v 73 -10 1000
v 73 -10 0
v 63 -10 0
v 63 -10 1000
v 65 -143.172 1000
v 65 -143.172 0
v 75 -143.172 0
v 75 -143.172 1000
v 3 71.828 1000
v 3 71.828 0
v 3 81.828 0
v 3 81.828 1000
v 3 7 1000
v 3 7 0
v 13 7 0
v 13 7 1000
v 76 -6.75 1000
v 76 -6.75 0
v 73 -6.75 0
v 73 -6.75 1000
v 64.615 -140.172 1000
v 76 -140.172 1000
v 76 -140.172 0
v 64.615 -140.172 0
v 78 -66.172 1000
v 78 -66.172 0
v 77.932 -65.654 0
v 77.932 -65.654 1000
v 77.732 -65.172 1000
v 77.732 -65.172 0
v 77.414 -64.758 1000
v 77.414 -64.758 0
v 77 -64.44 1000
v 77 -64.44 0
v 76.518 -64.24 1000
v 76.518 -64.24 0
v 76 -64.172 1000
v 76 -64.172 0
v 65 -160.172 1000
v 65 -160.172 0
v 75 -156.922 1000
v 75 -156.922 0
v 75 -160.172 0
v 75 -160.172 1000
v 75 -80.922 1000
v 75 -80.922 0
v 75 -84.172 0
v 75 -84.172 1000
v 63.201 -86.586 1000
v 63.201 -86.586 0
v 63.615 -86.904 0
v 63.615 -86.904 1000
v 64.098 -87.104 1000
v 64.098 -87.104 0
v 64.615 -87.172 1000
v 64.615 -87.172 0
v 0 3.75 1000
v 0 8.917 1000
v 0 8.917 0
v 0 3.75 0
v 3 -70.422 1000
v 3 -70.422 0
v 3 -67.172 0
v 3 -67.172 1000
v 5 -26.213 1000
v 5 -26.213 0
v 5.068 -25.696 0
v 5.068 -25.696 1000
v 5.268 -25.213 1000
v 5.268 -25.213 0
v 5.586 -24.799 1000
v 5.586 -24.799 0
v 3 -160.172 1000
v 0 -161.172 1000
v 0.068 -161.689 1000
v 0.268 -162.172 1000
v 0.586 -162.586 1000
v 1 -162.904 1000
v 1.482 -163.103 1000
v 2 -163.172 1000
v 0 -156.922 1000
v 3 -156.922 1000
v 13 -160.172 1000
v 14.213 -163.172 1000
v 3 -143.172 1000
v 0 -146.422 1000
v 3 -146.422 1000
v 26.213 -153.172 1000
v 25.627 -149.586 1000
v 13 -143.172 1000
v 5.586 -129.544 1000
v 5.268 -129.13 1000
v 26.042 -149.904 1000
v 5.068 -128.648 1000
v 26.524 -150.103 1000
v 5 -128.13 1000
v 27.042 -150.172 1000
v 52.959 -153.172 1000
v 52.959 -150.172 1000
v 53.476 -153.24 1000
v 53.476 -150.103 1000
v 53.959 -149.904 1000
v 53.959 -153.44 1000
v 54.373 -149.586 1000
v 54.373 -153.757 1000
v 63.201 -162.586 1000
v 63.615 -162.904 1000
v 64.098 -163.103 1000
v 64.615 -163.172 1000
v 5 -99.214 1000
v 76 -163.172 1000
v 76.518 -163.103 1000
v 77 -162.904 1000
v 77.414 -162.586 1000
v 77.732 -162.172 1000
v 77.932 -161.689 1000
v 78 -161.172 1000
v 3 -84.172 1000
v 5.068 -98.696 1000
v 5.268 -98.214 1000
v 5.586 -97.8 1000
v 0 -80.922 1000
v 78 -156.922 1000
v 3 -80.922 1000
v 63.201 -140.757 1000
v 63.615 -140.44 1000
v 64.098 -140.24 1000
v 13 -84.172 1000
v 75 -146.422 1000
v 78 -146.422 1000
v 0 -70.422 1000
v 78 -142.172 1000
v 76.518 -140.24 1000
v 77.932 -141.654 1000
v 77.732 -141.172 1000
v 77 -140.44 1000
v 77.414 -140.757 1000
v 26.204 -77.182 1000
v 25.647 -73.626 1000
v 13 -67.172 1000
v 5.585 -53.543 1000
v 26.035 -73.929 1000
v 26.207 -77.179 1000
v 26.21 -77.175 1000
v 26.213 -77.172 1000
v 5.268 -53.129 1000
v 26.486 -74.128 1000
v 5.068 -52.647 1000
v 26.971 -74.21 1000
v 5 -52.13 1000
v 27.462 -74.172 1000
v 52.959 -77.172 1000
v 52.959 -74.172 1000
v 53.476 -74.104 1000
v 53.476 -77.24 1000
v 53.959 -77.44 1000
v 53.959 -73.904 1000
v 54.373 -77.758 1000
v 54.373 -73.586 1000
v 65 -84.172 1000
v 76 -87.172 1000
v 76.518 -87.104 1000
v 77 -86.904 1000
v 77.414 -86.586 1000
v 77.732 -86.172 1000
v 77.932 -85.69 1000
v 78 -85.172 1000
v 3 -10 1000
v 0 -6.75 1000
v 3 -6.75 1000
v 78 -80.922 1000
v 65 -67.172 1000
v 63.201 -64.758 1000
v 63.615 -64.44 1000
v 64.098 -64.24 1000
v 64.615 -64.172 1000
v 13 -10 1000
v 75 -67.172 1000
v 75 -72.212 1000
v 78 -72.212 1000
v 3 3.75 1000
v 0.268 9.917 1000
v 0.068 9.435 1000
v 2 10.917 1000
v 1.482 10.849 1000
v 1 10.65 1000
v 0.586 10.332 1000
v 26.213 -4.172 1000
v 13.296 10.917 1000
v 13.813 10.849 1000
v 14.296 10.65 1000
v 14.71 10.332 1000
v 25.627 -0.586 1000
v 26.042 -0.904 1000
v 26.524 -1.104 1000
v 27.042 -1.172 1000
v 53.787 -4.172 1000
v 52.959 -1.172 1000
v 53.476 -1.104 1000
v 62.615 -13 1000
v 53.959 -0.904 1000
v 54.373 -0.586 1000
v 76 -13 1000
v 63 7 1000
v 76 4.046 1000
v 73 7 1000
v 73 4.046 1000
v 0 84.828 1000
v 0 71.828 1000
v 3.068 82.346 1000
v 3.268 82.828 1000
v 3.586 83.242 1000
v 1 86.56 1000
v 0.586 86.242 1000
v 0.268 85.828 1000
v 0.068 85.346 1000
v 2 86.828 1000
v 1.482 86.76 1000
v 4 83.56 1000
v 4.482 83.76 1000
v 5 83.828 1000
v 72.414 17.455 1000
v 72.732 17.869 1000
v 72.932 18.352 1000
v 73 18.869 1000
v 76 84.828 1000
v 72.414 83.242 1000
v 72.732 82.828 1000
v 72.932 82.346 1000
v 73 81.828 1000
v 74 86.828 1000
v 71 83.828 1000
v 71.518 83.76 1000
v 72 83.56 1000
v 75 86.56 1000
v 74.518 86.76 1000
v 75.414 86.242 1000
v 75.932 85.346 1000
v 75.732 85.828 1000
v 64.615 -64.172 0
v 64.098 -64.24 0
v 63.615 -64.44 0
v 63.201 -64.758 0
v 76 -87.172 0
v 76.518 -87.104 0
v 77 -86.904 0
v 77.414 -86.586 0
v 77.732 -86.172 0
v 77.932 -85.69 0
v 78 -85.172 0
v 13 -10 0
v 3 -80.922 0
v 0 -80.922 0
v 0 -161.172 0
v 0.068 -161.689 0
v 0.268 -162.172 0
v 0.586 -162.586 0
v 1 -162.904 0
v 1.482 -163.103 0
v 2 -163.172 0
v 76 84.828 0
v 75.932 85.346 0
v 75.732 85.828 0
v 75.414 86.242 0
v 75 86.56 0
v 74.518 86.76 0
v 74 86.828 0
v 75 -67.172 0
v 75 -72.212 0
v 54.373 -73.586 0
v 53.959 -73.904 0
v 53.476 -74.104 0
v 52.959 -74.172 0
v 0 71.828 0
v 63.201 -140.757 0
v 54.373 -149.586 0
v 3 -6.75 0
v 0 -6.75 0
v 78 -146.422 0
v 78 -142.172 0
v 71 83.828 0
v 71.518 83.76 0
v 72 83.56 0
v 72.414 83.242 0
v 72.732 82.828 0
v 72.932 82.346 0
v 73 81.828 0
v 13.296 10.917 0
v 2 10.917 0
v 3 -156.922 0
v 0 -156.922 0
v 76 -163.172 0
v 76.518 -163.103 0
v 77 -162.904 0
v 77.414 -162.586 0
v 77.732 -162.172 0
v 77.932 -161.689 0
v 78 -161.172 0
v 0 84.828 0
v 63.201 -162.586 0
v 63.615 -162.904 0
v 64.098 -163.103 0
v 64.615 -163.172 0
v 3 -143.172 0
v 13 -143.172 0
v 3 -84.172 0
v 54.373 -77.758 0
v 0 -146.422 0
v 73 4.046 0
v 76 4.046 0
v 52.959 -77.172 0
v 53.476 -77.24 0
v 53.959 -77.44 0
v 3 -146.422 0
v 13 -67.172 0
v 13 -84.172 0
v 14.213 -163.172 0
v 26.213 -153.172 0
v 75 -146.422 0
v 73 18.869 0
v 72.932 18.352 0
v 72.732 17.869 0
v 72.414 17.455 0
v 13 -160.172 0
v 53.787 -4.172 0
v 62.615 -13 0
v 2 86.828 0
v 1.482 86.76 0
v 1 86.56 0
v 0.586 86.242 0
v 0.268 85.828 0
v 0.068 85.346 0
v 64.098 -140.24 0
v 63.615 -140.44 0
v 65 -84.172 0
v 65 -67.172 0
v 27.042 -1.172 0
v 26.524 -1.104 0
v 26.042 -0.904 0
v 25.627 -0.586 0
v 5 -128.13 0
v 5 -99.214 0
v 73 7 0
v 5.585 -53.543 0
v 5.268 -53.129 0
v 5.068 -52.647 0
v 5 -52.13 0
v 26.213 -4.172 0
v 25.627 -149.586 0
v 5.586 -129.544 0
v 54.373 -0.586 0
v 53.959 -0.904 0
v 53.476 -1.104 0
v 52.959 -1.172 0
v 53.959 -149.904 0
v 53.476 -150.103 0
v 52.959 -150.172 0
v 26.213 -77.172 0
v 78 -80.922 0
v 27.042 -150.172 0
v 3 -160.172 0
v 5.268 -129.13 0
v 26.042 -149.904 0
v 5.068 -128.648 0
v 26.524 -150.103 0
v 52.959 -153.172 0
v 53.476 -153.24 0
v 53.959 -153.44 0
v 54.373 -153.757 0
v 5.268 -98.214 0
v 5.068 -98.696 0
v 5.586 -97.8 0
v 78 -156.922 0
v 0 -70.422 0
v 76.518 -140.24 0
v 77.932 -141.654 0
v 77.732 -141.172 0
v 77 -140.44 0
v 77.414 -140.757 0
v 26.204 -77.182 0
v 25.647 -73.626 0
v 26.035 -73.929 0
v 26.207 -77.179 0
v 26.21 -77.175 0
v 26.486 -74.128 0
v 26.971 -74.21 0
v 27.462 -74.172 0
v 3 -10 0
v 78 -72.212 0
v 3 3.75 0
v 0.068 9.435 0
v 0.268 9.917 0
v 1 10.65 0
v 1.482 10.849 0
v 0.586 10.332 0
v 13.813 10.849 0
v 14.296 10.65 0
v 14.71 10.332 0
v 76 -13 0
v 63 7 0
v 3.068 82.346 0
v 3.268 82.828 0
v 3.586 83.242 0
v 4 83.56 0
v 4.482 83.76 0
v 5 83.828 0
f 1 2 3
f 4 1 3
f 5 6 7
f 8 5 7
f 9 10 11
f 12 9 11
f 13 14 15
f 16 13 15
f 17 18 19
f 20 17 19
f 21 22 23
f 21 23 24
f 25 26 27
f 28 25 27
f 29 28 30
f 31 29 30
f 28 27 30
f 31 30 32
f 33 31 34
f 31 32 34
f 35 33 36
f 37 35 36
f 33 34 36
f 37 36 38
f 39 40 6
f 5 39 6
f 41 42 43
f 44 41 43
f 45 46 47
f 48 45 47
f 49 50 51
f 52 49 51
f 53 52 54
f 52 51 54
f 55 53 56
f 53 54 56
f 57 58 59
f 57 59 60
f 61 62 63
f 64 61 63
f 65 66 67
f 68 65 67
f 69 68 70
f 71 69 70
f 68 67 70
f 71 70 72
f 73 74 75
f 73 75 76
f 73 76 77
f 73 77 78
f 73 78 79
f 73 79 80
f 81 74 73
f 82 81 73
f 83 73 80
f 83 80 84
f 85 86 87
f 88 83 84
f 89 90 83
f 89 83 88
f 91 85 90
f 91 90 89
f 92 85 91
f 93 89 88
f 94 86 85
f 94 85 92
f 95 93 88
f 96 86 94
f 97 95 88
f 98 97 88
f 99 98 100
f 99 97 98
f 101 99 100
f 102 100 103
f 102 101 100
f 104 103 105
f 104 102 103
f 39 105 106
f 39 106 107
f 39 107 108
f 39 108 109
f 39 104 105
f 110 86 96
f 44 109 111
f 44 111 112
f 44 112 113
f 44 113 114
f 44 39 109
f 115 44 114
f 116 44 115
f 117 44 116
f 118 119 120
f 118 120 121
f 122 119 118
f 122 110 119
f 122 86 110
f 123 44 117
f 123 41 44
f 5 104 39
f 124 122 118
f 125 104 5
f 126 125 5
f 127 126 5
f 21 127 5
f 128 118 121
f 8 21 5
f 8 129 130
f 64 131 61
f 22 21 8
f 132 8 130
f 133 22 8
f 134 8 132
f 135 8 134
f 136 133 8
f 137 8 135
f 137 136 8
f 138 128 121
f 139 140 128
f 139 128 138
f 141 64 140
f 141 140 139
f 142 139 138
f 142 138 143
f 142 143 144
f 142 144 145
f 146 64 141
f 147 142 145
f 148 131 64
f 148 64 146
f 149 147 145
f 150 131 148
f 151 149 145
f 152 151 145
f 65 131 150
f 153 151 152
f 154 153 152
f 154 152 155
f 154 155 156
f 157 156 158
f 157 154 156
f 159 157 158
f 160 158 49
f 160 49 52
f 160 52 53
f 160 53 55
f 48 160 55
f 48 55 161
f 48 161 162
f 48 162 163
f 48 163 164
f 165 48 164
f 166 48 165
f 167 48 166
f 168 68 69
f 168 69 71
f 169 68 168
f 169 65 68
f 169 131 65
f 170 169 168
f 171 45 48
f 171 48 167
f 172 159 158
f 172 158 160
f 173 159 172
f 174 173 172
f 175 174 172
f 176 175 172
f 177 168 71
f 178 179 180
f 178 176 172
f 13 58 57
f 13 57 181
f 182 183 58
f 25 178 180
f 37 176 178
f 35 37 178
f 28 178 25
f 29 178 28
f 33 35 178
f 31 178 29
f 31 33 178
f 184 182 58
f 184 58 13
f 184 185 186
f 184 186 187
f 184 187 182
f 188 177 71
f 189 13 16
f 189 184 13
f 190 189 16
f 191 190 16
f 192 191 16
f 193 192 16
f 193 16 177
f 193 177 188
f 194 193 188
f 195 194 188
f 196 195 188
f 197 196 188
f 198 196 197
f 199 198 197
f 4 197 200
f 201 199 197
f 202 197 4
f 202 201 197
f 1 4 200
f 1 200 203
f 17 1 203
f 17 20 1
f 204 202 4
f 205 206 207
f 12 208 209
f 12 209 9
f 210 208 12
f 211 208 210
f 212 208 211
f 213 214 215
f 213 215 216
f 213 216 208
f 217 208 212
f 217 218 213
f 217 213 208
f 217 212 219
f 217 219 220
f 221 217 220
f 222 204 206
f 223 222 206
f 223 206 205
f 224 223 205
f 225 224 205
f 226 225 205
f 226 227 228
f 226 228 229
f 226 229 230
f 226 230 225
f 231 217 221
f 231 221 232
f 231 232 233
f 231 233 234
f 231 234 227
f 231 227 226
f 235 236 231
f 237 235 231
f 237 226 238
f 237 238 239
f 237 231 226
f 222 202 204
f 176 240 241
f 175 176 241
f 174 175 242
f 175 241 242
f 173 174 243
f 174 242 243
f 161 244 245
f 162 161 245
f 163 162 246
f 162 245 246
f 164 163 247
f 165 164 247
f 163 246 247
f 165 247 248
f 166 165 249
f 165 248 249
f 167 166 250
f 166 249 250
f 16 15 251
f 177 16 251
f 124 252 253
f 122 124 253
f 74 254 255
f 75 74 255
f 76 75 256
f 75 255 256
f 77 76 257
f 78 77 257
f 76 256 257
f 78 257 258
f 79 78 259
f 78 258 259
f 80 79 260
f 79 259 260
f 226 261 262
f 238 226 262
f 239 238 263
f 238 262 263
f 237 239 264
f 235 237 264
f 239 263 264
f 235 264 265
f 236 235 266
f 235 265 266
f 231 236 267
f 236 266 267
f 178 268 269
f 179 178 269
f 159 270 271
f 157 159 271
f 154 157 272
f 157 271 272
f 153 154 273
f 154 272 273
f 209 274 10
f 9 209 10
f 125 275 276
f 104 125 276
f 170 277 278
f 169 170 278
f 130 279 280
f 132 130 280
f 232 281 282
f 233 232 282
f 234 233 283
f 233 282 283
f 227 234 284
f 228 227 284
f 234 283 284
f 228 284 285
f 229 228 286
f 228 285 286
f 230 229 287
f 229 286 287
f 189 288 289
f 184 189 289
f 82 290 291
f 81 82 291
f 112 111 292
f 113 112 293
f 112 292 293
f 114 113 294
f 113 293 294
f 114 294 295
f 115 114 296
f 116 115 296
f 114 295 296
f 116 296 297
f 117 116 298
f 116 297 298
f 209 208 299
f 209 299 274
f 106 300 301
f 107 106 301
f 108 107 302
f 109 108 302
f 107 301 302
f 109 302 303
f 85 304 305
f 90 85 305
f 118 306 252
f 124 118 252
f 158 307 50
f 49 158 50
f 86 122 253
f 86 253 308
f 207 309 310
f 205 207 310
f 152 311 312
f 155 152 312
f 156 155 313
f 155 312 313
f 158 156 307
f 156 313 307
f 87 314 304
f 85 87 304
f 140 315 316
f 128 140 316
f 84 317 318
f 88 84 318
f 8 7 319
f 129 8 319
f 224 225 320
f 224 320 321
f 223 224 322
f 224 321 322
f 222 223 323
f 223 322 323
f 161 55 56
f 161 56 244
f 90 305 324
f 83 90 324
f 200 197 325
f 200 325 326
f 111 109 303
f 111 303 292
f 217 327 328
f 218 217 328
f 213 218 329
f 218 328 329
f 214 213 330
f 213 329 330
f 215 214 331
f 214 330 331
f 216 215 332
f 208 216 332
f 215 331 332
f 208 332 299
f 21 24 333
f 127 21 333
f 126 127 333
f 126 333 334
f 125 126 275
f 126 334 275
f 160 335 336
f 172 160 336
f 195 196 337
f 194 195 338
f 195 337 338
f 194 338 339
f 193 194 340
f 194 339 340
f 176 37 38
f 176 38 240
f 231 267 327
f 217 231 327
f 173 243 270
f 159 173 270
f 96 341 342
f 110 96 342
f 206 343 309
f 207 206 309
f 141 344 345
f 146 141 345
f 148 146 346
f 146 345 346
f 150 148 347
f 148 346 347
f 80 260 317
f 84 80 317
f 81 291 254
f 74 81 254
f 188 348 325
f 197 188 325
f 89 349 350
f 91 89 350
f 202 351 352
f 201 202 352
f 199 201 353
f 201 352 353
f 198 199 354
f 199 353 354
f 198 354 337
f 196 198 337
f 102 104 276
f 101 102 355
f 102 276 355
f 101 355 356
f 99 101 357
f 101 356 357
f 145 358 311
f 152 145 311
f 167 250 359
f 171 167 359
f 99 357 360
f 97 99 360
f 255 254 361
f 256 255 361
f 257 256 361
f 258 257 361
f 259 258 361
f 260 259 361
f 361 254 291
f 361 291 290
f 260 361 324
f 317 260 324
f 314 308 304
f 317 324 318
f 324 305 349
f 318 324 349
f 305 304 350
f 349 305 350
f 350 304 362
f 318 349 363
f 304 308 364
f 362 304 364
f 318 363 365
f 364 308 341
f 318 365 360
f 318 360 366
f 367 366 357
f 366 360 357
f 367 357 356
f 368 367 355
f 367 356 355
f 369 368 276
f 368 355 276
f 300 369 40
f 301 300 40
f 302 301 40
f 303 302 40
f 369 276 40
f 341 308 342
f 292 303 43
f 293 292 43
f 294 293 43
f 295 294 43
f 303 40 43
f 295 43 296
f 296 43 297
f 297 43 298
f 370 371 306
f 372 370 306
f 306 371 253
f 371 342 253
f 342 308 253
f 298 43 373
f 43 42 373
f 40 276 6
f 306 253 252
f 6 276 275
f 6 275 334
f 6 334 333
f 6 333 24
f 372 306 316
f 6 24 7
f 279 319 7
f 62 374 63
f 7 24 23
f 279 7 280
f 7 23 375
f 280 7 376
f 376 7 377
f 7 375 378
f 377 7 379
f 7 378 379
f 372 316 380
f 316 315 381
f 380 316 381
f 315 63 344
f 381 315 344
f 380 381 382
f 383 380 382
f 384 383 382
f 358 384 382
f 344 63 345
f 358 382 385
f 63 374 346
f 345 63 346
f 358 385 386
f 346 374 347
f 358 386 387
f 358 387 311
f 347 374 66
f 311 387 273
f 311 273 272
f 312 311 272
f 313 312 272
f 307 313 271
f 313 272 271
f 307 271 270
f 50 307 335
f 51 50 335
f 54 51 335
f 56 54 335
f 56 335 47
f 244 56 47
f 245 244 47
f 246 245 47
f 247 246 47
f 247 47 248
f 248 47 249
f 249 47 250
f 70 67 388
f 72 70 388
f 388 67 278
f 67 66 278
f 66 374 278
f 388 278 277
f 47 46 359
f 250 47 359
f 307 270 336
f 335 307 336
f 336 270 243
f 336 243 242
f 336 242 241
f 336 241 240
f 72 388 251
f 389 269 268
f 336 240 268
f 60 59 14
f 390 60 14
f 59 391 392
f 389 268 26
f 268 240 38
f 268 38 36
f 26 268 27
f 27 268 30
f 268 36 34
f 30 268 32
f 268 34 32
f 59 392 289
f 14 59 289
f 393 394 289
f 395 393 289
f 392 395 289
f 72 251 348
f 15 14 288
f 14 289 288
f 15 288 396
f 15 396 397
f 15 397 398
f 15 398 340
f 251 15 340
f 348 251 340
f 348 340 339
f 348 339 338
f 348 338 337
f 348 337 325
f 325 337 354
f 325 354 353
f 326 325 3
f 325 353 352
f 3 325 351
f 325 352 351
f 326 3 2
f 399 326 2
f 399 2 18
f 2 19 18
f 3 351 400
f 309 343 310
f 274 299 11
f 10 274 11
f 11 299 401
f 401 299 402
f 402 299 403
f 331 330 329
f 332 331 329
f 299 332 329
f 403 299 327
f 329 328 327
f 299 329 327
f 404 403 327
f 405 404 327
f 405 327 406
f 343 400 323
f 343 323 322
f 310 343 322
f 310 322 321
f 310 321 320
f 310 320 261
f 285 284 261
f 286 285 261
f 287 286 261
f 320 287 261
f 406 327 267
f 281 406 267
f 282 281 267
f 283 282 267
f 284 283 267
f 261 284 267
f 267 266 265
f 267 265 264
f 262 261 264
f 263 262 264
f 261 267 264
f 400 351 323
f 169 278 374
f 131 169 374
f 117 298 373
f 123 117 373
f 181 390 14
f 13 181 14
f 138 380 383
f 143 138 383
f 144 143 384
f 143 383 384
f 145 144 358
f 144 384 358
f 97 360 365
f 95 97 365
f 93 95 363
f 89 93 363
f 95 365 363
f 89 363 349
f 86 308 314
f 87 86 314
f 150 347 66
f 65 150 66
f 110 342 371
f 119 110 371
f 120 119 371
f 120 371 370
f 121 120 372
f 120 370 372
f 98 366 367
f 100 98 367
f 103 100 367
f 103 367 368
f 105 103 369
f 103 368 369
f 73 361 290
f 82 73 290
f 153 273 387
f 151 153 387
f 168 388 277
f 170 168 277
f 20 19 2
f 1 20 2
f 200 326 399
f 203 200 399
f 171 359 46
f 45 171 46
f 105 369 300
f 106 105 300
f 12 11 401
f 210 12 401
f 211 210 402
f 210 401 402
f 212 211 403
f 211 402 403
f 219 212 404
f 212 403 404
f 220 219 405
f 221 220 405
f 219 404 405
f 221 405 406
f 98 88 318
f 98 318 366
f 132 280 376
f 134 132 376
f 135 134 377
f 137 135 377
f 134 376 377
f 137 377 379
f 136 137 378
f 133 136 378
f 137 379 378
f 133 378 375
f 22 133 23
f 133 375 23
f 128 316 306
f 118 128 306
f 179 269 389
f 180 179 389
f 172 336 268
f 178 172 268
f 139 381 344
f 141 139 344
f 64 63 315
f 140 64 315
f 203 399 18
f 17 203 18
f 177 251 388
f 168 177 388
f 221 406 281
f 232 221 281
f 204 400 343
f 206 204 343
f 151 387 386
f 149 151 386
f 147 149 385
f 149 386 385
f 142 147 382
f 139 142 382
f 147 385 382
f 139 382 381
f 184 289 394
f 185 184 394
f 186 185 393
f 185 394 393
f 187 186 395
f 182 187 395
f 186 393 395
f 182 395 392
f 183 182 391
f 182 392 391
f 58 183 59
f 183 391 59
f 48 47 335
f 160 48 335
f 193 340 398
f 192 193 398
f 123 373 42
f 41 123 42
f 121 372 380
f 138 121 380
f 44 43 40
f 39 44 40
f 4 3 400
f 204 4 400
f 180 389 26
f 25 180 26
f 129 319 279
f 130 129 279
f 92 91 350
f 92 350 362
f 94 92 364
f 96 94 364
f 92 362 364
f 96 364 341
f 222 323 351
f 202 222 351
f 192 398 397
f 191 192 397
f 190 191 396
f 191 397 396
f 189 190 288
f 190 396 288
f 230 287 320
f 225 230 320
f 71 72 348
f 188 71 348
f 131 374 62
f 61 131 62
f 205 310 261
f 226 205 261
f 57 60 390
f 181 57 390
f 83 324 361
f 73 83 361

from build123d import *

# Parameters (mm, degrees)
F1_DEPTH = 1000


with BuildPart() as f1:
    # F0 (on Top) → F1 (new body)
    with BuildSketch(Plane.XY):
        with BuildLine():
            Line((0, 8.917465), (0, 3.75))
            Line((0, 3.75), (3, 3.75))
            Line((3, 3.75), (3, 7))
            Line((3, 7), (13, 7))
            Line((13, 7), (13, -10))
            Line((13, -10), (3, -10))
            Line((3, -10), (3, -6.75))
            Line((3, -6.75), (0, -6.75))
            Line((0, -6.75), (0, -70.421975))
            Line((0, -70.421975), (3, -70.421975))
            Line((3, -70.421975), (3, -67.171975))
            Line((3, -67.171975), (13, -67.171975))
            Line((13, -67.171975), (13, -84.171975))
            Line((13, -84.171975), (3, -84.171975))
            Line((3, -84.171975), (3, -80.921975))
            Line((3, -80.921975), (0, -80.921975))
            Line((0, -80.921975), (0, -146.421568))
            Line((0, -146.421568), (3, -146.421568))
            Line((3, -146.421568), (3, -143.171568))
            Line((3, -143.171568), (13, -143.171568))
            Line((13, -143.171568), (13, -160.171568))
            Line((13, -160.171568), (3, -160.171568))
            Line((3, -160.171568), (3, -156.921568))
            Line((3, -156.921568), (0, -156.921568))
            Line((0, -156.921568), (0, -161.171568))
            ThreePointArc((0, -161.171568), (0.585786, -162.585782), (2, -163.171568))
            Line((2, -163.171568), (14.213203, -163.171568))
            Line((14.213203, -163.171568), (26.213203, -153.171568))
            Line((26.213203, -153.171568), (52.958573, -153.171568))
            ThreePointArc((52.958573, -153.171568), (53.72394, -153.323809), (54.372786, -153.757355))
            Line((54.372786, -153.757355), (63.201214, -162.585782))
            ThreePointArc((63.201214, -162.585782), (63.85006, -163.019327), (64.615427, -163.171568))
            Line((64.615427, -163.171568), (76, -163.171568))
            ThreePointArc((76, -163.171568), (77.414214, -162.585782), (78, -161.171568))
            Line((78, -161.171568), (78, -156.921568))
            Line((78, -156.921568), (75, -156.921568))
            Line((75, -156.921568), (75, -160.171568))
            Line((75, -160.171568), (65, -160.171568))
            Line((65, -160.171568), (65, -143.171568))
            Line((65, -143.171568), (75, -143.171568))
            Line((75, -143.171568), (75, -146.421568))
            Line((75, -146.421568), (78, -146.421568))
            Line((78, -146.421568), (78, -142.171568))
            ThreePointArc((78, -142.171568), (77.414214, -140.757355), (76, -140.171568))
            Line((76, -140.171568), (64.615427, -140.171568))
            ThreePointArc((64.615427, -140.171568), (63.85006, -140.323809), (63.201214, -140.757355))
            Line((63.201214, -140.757355), (54.372786, -149.585782))
            ThreePointArc((54.372786, -149.585782), (53.72394, -150.019327), (52.958573, -150.171568))
            Line((52.958573, -150.171568), (27.041631, -150.171568))
            ThreePointArc((27.041631, -150.171568), (26.276264, -150.019327), (25.627417, -149.585782))
            Line((25.627417, -149.585782), (5.585786, -129.544151))
            ThreePointArc((5.585786, -129.544151), (5.152241, -128.895305), (5, -128.129938))
            Line((5, -128.129938), (5, -99.213743))
            ThreePointArc((5, -99.213743), (5.152241, -98.448376), (5.585786, -97.79953))
            Line((5.585786, -97.79953), (26.203506, -77.18181))
            ThreePointArc((26.203506, -77.18181), (26.208346, -77.176986), (26.213203, -77.172179))
            Line((26.213203, -77.172179), (52.958776, -77.172179))
            ThreePointArc((52.958776, -77.172179), (53.724143, -77.32442), (54.37299, -77.757965))
            Line((54.37299, -77.757965), (63.201214, -86.586189))
            ThreePointArc((63.201214, -86.586189), (63.85006, -87.019734), (64.615427, -87.171975))
            Line((64.615427, -87.171975), (76, -87.171975))
            ThreePointArc((76, -87.171975), (77.414214, -86.586189), (78, -85.171975))
            Line((78, -85.171975), (78, -80.921975))
            Line((78, -80.921975), (75, -80.921975))
            Line((75, -80.921975), (75, -84.171975))
            Line((75, -84.171975), (65, -84.171975))
            Line((65, -84.171975), (65, -67.171975))
            Line((65, -67.171975), (75, -67.171975))
            Line((75, -67.171975), (75, -72.212282))
            Line((75, -72.212282), (78, -72.212282))
            Line((78, -72.212282), (78, -66.171975))
            ThreePointArc((78, -66.171975), (77.414214, -64.757762), (76, -64.171975))
            Line((76, -64.171975), (64.615427, -64.171975))
            ThreePointArc((64.615427, -64.171975), (63.85006, -64.324216), (63.201214, -64.757762))
            Line((63.201214, -64.757762), (54.37299, -73.585985))
            ThreePointArc((54.37299, -73.585985), (53.724143, -74.019531), (52.958776, -74.171772))
            Line((52.958776, -74.171772), (27.462442, -74.171772))
            ThreePointArc((27.462442, -74.171772), (26.485926, -74.127537), (25.647012, -73.625777))
            Line((25.647012, -73.625777), (5.585068, -53.543433))
            ThreePointArc((5.585068, -53.543433), (5.152047, -52.894835), (5, -52.129938))
            Line((5, -52.129938), (5, -26.213199))
            ThreePointArc((5, -26.213199), (5.152241, -25.447832), (5.585786, -24.798985))
            Line((5.585786, -24.798985), (26.213203, -4.171772))
            Line((26.213203, -4.171772), (53.787203, -4.171772))
            Line((53.787203, -4.171772), (62.615432, -13))
            Line((62.615432, -13), (76, -13))
            Line((76, -13), (76, -6.75))
            Line((76, -6.75), (73, -6.75))
            Line((73, -6.75), (73, -10))
            Line((73, -10), (63, -10))
            Line((63, -10), (63, 7))
            Line((63, 7), (73, 7))
            Line((73, 7), (73, 4.045606))
            Line((73, 4.045606), (76, 4.045606))
            Line((76, 4.045606), (76, 84.828228))
            ThreePointArc((76, 84.828228), (75.414214, 86.242442), (74, 86.828228))
            Line((74, 86.828228), (2, 86.828228))
            ThreePointArc((2, 86.828228), (0.585786, 86.242442), (0, 84.828228))
            Line((0, 84.828228), (0, 71.828228))
            Line((0, 71.828228), (3, 71.828228))
            Line((3, 71.828228), (3, 81.828228))
            ThreePointArc((3, 81.828228), (3.585786, 83.242442), (5, 83.828228))
            Line((5, 83.828228), (71, 83.828228))
            ThreePointArc((71, 83.828228), (72.414214, 83.242442), (73, 81.828228))
            Line((73, 81.828228), (73, 18.869452))
            ThreePointArc((73, 18.869452), (72.847759, 18.104085), (72.414214, 17.455238))
            Line((72.414214, 17.455238), (54.37299, -0.585985))
            ThreePointArc((54.37299, -0.585985), (53.724143, -1.019531), (52.958776, -1.171772))
            Line((52.958776, -1.171772), (27.041631, -1.171772))
            ThreePointArc((27.041631, -1.171772), (26.276264, -1.019531), (25.627417, -0.585985))
            Line((25.627417, -0.585985), (14.709753, 10.331678))
            ThreePointArc((14.709753, 10.331678), (14.060907, 10.765224), (13.29554, 10.917465))
            Line((13.29554, 10.917465), (2, 10.917465))
            ThreePointArc((2, 10.917465), (0.585786, 10.331678), (0, 8.917465))
        make_face()
    extrude(amount=F1_DEPTH)


solid = f1.part
